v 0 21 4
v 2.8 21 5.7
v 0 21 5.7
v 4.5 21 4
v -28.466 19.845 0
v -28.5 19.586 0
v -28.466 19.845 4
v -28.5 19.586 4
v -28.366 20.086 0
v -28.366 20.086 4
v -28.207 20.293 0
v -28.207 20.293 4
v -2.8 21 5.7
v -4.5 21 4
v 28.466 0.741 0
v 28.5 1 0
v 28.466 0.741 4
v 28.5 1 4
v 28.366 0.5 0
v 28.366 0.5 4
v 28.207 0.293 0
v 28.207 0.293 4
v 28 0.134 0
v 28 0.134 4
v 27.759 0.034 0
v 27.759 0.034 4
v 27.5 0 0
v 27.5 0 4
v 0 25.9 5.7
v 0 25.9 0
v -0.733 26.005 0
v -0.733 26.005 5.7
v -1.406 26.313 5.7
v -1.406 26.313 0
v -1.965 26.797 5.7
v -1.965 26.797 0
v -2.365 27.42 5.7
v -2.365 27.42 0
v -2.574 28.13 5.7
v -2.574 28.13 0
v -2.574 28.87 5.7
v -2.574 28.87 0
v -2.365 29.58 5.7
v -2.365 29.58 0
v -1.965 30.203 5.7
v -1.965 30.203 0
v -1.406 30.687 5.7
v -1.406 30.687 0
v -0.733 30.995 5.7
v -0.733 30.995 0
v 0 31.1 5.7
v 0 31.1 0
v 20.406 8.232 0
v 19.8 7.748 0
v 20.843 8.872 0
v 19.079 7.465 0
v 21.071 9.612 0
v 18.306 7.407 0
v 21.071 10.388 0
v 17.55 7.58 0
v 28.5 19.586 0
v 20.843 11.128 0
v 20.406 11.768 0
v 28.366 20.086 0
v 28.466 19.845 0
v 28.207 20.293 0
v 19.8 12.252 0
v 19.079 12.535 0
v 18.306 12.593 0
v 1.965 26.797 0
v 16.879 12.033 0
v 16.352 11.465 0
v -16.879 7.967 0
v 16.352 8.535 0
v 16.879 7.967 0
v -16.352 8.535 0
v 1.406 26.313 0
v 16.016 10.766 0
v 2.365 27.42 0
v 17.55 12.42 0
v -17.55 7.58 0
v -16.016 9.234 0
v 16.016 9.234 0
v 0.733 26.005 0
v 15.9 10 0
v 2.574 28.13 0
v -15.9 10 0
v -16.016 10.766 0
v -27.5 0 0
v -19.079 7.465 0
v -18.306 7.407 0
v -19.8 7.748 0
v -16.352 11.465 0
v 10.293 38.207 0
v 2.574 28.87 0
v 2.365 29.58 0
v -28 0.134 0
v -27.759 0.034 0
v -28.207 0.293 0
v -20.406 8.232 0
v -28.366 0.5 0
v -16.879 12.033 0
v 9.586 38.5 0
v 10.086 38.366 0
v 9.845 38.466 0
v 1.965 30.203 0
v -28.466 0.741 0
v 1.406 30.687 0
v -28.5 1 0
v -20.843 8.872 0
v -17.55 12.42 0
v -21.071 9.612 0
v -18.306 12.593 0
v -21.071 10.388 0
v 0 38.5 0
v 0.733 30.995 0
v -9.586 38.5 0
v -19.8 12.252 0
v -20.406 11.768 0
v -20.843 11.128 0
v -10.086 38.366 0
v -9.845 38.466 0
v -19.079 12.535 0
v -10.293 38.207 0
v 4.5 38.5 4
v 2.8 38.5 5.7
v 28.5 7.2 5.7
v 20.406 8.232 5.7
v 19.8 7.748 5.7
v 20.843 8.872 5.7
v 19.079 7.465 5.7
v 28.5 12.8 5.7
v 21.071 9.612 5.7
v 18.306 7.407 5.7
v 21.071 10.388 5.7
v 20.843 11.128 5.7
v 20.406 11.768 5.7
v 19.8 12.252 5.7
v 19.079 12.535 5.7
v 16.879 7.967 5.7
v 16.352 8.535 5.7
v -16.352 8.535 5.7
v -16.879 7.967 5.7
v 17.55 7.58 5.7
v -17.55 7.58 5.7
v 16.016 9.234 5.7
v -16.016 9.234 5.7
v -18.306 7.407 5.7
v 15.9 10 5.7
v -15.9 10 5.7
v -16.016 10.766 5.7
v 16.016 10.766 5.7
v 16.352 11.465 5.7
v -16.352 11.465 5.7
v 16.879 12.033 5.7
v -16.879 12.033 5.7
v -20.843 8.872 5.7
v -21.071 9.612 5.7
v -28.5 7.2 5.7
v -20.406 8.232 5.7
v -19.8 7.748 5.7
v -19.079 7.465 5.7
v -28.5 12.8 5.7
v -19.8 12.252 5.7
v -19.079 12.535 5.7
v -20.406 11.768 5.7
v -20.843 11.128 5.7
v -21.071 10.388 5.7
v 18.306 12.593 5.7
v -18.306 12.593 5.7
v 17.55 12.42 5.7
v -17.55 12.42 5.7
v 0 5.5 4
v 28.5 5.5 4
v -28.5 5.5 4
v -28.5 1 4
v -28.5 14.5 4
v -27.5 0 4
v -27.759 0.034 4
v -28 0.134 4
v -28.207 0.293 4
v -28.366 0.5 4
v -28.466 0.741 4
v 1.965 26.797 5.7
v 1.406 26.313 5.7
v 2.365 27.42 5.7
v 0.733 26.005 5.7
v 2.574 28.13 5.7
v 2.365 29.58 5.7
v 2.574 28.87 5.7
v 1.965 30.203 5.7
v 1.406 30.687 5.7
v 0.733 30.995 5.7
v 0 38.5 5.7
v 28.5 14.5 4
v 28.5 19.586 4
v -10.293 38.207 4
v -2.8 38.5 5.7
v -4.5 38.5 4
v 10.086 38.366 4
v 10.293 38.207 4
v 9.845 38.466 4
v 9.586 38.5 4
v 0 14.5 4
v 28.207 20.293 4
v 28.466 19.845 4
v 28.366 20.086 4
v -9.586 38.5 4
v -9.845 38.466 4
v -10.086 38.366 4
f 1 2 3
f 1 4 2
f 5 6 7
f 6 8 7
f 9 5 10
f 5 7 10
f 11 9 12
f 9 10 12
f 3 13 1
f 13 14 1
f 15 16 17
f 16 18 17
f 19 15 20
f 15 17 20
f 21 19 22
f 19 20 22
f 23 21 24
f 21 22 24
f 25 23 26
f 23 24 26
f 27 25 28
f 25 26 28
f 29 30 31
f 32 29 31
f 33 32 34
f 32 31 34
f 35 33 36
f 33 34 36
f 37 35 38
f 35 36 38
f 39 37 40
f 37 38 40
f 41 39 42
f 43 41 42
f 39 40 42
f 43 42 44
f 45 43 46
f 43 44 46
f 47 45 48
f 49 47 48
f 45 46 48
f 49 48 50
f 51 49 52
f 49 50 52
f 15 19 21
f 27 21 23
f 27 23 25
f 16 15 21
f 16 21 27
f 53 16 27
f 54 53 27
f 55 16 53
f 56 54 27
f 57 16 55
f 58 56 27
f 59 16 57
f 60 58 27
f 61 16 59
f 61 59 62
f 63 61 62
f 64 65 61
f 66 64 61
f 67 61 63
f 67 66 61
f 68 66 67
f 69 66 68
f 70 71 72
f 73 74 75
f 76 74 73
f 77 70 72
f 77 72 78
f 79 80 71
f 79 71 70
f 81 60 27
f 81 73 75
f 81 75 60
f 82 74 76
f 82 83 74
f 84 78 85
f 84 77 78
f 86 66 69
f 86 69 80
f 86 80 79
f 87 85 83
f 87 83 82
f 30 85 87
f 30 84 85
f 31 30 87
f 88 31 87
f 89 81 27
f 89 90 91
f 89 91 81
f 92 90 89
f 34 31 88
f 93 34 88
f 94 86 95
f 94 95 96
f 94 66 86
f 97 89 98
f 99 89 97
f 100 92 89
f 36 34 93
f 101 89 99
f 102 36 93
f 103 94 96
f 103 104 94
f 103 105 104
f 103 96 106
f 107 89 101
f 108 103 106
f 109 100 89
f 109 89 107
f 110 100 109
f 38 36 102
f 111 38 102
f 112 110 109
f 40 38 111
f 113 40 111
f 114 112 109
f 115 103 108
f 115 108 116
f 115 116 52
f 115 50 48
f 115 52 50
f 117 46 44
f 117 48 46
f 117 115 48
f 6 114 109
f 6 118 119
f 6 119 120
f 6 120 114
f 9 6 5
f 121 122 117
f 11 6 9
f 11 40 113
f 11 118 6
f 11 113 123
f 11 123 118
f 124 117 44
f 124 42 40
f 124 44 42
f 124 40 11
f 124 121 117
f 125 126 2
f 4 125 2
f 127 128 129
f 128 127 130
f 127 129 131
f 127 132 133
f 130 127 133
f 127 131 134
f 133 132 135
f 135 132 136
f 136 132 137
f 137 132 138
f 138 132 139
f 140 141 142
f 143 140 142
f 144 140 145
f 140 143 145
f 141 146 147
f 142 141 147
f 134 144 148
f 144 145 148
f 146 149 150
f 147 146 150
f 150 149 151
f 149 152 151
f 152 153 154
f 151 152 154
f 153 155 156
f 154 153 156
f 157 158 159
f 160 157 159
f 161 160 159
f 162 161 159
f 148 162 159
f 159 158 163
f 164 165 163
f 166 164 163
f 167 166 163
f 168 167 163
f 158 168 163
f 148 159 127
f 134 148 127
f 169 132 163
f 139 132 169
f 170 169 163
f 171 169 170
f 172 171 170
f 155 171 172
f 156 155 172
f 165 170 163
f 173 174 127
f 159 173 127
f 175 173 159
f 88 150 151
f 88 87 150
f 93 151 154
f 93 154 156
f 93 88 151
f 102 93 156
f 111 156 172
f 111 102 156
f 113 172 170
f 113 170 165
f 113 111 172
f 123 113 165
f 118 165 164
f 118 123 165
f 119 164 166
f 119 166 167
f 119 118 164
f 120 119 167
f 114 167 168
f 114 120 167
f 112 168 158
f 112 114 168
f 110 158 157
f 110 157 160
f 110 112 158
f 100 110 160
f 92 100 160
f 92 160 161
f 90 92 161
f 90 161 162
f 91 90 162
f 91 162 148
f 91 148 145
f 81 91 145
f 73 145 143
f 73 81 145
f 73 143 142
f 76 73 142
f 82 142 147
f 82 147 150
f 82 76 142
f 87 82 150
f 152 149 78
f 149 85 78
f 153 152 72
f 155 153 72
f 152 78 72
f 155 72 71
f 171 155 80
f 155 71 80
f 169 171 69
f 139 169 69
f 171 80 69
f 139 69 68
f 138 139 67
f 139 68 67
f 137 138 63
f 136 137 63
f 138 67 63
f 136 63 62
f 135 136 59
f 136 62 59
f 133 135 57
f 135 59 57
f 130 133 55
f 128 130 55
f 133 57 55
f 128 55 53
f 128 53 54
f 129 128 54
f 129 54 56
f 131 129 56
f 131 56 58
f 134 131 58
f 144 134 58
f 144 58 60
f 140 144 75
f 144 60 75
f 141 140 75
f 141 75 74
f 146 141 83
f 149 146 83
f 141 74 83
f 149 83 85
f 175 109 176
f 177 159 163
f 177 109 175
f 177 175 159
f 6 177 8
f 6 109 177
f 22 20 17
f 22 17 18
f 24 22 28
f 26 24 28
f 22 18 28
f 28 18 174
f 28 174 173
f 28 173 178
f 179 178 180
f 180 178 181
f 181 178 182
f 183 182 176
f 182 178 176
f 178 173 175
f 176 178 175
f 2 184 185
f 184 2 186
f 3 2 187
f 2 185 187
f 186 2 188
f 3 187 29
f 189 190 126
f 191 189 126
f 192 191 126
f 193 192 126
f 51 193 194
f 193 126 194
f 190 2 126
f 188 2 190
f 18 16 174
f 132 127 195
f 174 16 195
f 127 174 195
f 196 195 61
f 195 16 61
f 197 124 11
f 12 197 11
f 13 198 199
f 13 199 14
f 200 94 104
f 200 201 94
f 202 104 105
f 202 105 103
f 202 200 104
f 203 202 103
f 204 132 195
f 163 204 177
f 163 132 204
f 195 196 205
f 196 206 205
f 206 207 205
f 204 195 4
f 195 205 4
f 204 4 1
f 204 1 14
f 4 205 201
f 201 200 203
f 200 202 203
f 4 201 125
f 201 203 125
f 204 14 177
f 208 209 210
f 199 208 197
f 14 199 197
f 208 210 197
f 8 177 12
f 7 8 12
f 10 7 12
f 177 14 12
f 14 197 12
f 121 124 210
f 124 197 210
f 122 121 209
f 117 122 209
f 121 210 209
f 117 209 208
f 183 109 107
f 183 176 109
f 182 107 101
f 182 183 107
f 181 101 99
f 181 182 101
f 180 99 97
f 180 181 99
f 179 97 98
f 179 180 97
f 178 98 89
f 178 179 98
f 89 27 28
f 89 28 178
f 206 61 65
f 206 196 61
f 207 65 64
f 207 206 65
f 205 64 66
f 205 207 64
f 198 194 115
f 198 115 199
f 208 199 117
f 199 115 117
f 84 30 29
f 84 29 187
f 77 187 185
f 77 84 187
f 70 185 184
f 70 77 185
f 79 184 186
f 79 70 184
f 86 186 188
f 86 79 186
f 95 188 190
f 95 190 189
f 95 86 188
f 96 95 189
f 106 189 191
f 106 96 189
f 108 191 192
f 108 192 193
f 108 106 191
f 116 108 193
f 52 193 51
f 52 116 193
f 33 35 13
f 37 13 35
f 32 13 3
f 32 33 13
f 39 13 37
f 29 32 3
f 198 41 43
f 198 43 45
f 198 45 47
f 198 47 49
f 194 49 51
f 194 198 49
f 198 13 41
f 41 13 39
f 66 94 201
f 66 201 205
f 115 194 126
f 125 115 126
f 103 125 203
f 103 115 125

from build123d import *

# Parameters (mm, degrees)
F0_R     = 2.6
F1_DEPTH = 4
F2_W     = 28.5
F2_H     = 9
F2_R     = 2.6
F3_DEPTH = 1.7
F4_SIZE  = 1.69999
F5_R     = 1


# Not quite as in the source:
# - a fillet or chamfer is up to 0.001 mm smaller than in the source, because OpenCascade refuses the exact size


with BuildPart() as f1:
    # F0 (on Top) → F1 (new body)
    with BuildSketch(Plane.XY):
        with BuildLine():
            Line((-28.5, 0), (0, 0))
            Line((0, 0), (0, 25.9))
            ThreePointArc((0, 25.9), (-2.6, 28.5), (0, 31.1))
            Line((0, 31.1), (0, 38.5))
            Line((0, 38.5), (-10, 38.5))
            Line((-10, 38.5), (-28.5, 20))
            Line((-28.5, 20), (-28.5, 0))
        make_face()
        with Locations((-18.5, 10)):
            Circle(F0_R, mode=Mode.SUBTRACT)
    extrude(amount=F1_DEPTH)

    # F2 (on face) → F3 (join)
    with BuildSketch(Plane.XY.offset(4)):
        with Locations((-14.25, 10)):
            Rectangle(F2_W, F2_H)
        with Locations((-18.5, 10)):
            Circle(F2_R, mode=Mode.SUBTRACT)
        with BuildLine():
            ThreePointArc((0, 25.9), (-2.6, 28.5), (0, 31.1))
            Line((0, 31.1), (0, 38.5))
            Line((0, 38.5), (-4.5, 38.5))
            Line((-4.5, 38.5), (-4.5, 21))
            Line((-4.5, 21), (0, 21))
            Line((0, 21), (0, 25.9))
        make_face()
    extrude(amount=F3_DEPTH)

    # F4 (size 1.7 in the source; OpenCascade refuses exactly that, so slightly less here)
    f4_edges = [f1.edges().sort_by_distance(p)[0] for p in [
        (-14.25, 14.5, 5.7),
        (-14.25, 5.5, 5.7),
        (-4.5, 29.75, 5.7),
    ]]
    chamfer(f4_edges, length=F4_SIZE)

    # F5
    f5_edges = [f1.edges().sort_by_distance(p)[0] for p in [
        (-10, 38.5, 2),
        (-28.5, 20, 2),
        (-28.5, 0, 2),
    ]]
    fillet(f5_edges, radius=F5_R)

    # F6: F1 across face


with BuildPart() as f1_1:
    add(f1.part)
    add(f1.part.mirror(Plane(origin=(0, 34.8, 2.85), x_dir=(0, 1, 0), z_dir=(1, 0, 0))))


solid = f1_1.part
